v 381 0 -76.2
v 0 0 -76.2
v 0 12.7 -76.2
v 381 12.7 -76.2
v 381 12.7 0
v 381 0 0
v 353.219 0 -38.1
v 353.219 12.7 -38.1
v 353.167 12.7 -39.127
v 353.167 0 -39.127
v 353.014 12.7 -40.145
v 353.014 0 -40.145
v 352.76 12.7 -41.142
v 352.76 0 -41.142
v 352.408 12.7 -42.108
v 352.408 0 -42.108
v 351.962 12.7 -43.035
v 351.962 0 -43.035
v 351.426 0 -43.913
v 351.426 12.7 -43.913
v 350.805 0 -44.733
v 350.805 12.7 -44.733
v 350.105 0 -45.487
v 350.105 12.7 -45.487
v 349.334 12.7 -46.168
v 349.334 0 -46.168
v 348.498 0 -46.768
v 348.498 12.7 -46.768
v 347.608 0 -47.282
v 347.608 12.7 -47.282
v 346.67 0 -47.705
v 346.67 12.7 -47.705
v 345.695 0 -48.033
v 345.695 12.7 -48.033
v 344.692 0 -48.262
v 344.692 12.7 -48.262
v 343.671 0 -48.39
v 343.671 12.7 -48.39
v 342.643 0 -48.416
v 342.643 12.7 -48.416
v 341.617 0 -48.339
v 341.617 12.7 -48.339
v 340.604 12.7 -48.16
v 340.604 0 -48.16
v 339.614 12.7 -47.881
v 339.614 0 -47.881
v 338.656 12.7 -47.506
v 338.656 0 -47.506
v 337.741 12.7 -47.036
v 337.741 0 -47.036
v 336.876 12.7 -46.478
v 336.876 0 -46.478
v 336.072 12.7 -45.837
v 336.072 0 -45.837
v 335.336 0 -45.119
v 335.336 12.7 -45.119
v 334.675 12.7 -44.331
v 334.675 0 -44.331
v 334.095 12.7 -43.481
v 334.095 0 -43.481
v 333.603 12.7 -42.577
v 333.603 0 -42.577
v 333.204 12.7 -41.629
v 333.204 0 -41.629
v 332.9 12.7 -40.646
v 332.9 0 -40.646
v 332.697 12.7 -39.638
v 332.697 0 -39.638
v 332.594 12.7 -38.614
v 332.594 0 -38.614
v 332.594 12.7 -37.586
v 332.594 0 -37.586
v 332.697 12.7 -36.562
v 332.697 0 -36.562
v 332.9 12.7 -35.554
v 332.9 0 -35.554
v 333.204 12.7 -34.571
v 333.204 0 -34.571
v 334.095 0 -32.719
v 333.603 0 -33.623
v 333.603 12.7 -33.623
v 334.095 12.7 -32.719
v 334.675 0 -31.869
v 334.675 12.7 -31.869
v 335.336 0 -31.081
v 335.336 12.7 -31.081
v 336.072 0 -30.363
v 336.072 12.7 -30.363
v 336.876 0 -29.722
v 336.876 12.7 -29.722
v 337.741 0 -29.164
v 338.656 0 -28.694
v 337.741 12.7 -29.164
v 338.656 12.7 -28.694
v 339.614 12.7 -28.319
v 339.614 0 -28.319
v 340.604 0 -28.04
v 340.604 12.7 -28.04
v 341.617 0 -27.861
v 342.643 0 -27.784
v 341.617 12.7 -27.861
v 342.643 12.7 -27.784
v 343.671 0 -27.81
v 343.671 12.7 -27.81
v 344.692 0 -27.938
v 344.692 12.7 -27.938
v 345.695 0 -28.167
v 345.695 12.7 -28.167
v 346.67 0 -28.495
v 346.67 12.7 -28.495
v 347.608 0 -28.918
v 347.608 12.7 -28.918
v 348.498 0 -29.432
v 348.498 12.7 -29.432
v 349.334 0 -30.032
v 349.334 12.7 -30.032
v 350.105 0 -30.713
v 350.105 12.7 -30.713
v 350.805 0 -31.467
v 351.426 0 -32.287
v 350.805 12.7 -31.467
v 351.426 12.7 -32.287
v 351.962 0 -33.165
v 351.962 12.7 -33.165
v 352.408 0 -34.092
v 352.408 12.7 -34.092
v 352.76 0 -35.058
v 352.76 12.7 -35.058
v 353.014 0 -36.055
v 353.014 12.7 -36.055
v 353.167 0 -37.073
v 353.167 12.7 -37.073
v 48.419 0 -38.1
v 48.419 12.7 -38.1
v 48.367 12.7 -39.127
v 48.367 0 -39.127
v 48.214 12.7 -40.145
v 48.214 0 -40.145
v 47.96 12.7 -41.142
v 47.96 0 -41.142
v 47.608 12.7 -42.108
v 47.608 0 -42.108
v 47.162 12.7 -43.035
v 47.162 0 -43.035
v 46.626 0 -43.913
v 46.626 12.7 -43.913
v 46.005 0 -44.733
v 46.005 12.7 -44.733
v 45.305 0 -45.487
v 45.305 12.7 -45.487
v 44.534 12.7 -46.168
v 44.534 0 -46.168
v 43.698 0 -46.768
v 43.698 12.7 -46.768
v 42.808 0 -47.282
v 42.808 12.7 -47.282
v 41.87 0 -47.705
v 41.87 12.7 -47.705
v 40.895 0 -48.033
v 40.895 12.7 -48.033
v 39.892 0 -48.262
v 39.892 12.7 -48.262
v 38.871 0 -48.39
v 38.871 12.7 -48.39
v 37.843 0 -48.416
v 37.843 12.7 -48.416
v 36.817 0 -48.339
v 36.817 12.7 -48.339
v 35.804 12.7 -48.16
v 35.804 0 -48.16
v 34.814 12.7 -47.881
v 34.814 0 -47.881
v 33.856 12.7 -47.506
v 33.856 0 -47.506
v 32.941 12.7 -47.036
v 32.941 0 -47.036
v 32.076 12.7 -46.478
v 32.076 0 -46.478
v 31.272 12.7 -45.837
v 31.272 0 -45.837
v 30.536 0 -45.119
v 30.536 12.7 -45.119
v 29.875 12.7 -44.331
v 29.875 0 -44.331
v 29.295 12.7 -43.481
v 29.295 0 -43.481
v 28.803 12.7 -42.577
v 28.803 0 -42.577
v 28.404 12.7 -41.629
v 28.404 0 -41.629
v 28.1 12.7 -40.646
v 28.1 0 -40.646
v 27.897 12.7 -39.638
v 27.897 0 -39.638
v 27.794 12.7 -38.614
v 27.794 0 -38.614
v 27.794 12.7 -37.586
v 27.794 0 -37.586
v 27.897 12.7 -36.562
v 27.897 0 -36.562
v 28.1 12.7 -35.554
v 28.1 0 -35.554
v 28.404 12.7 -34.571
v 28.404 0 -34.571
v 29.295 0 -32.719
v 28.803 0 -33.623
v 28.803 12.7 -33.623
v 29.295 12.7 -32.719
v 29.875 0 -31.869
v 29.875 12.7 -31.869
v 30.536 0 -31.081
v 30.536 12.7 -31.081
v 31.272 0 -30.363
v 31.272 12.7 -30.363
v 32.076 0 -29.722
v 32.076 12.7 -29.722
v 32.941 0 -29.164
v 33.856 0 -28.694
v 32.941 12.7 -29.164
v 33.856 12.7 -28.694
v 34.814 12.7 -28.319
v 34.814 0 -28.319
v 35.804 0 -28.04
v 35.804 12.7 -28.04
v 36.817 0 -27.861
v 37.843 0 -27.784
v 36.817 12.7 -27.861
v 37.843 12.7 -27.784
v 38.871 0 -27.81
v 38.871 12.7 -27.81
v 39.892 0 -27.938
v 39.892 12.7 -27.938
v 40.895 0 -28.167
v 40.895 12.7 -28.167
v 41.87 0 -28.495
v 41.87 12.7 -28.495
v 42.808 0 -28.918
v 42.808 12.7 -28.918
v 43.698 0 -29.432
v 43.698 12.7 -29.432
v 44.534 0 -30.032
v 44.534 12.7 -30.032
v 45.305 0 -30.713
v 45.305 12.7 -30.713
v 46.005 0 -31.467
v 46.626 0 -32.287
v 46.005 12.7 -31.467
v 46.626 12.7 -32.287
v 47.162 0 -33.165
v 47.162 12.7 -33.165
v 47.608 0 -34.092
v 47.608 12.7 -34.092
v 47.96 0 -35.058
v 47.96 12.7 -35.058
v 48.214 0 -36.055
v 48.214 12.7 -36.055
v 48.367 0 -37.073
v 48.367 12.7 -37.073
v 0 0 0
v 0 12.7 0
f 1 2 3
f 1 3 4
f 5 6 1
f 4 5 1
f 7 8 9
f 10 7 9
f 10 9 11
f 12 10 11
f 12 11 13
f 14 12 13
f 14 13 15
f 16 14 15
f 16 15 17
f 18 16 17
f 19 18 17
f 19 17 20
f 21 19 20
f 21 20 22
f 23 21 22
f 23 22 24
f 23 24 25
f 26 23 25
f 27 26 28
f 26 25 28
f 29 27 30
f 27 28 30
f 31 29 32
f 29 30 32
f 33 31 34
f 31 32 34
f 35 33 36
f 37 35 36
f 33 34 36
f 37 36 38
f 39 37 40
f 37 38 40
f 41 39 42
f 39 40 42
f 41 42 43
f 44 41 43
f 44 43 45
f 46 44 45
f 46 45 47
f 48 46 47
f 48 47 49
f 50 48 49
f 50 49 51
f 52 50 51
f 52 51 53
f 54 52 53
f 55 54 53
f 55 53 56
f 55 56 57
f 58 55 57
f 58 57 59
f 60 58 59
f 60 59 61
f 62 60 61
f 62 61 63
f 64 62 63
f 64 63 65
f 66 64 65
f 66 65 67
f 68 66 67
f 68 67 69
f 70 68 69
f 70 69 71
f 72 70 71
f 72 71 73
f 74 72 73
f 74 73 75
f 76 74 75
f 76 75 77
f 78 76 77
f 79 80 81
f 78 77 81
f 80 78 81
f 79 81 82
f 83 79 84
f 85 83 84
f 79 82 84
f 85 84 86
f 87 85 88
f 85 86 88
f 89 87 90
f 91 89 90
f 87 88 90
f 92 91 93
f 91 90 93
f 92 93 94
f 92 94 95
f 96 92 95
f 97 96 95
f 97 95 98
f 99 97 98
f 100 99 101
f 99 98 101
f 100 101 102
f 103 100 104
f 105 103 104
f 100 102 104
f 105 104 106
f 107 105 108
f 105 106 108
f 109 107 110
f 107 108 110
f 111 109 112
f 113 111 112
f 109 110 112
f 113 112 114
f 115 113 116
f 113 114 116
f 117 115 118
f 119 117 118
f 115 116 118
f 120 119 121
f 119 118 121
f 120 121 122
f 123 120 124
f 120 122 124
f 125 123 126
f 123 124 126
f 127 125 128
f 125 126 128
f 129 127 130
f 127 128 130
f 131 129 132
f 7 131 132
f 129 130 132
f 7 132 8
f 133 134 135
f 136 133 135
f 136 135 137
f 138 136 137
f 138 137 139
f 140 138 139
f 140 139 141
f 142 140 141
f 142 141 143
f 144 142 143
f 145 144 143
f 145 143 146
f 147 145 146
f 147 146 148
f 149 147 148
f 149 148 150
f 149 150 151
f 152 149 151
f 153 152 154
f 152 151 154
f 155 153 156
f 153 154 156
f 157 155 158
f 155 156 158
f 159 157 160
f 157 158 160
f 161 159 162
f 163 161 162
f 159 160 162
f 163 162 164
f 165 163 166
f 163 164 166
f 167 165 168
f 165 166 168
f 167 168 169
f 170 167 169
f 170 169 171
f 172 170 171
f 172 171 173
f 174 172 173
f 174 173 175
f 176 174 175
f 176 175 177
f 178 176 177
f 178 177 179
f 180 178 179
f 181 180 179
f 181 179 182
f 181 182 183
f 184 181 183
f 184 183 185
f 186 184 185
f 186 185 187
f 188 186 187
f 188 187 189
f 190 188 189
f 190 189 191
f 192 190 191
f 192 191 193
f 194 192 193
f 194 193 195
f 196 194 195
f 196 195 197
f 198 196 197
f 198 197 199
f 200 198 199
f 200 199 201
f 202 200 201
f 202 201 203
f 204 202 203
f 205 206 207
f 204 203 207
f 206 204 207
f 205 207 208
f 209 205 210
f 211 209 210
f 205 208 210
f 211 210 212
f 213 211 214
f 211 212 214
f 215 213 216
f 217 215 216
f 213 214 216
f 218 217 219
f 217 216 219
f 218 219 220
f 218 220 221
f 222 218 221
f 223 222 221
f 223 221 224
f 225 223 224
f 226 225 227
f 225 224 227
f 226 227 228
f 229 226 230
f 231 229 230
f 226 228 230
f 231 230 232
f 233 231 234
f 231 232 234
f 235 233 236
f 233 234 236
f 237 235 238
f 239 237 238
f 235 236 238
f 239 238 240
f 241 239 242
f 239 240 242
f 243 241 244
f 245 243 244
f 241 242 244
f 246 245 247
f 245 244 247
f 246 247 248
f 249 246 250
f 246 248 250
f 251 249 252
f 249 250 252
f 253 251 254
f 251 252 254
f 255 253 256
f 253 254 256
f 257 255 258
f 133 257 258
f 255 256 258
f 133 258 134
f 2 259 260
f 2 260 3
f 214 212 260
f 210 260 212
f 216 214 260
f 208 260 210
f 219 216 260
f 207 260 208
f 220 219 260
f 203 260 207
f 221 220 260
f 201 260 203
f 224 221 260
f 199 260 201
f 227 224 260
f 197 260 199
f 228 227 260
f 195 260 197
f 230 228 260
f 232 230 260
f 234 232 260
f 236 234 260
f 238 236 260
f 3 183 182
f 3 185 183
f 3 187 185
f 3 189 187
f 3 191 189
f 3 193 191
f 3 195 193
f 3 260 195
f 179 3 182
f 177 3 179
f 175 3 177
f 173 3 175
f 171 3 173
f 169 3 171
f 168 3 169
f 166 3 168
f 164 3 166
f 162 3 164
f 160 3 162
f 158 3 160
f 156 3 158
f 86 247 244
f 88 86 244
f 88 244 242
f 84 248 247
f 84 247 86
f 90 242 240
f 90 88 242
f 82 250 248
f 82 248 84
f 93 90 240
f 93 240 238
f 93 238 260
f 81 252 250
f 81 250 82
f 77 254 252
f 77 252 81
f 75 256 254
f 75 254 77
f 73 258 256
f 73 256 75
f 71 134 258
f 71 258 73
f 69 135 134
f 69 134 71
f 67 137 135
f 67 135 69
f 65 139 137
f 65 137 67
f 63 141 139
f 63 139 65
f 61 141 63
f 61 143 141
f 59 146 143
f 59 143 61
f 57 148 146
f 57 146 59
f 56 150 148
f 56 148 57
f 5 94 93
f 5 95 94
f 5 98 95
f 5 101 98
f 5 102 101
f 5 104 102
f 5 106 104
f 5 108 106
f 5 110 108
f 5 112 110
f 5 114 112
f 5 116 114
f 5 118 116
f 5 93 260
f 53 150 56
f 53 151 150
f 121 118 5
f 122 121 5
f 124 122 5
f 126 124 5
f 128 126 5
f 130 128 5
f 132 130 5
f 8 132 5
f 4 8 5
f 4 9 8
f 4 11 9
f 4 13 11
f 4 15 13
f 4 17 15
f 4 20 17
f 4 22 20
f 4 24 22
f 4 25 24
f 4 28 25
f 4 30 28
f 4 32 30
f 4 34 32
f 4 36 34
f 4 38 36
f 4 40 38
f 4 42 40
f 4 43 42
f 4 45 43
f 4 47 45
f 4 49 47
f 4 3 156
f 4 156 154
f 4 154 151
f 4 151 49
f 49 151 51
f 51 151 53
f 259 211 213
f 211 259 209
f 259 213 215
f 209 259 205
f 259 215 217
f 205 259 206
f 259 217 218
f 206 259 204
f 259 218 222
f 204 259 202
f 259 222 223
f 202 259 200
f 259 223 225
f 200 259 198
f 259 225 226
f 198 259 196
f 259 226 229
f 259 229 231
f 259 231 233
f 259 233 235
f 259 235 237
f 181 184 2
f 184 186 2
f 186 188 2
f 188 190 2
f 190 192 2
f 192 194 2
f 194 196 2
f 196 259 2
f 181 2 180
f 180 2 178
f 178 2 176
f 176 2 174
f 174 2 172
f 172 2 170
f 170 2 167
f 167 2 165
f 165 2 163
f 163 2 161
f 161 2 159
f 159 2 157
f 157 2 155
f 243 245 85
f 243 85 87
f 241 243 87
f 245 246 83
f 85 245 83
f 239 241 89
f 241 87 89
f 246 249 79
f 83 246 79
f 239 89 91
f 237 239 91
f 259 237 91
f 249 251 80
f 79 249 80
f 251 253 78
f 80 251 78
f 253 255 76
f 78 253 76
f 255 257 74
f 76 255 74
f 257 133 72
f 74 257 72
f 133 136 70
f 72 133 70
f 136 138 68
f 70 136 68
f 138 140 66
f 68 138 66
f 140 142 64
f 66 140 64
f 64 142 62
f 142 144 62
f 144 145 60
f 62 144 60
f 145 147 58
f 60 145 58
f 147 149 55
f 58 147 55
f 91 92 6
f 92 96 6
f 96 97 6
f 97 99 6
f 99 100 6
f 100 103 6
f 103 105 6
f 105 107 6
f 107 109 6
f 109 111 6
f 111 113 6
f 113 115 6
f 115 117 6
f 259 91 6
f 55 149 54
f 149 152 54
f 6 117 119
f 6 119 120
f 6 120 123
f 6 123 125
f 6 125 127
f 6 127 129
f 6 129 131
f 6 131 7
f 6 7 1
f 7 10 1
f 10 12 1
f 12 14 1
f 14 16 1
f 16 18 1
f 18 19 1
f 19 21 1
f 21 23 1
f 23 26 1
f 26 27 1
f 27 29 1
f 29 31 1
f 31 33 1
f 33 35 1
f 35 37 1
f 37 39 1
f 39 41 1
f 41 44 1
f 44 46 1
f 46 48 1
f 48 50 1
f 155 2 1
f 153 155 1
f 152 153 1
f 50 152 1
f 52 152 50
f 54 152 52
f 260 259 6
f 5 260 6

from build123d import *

# Parameters (mm, degrees)
SKETCH1_W           = 381
SKETCH1_H           = 76.2
BOSS_EXTRUDE1_DEPTH = 12.7
CUT_EXTRUDE1_REACH  = 14.7
SKETCH2_R           = 10.31875


with BuildPart() as part:
    # Sketch1 → Boss-Extrude1 (new body)
    with BuildSketch(Plane(origin=(0, 0, 0), x_dir=(1, 0, 0), z_dir=(0, 1, 0))):
        with Locations((190.5, 38.1)):
            Rectangle(SKETCH1_W, SKETCH1_H)
    extrude(amount=BOSS_EXTRUDE1_DEPTH)

    # Sketch2 → Cut-Extrude1 (cut, up to next)
    with BuildSketch(Plane(origin=(0, 12.7, 0), x_dir=(1, 0, 0), z_dir=(0, 1, 0)), mode=Mode.PRIVATE) as cut_extrude1_sk1:
        with Locations((38.1, 38.1)):
            Circle(SKETCH2_R)
    cut_extrude1_tool1 = extrude(cut_extrude1_sk1.sketch, amount=-CUT_EXTRUDE1_REACH, mode=Mode.PRIVATE) & part.part
    add(cut_extrude1_tool1.solids().sort_by_distance((38.1, 12.7, -38.1))[0], mode=Mode.SUBTRACT)
    # Sketch2 → Cut-Extrude1 (cut, up to next)
    with BuildSketch(Plane(origin=(0, 12.7, 0), x_dir=(1, 0, 0), z_dir=(0, 1, 0)), mode=Mode.PRIVATE) as cut_extrude1_sk2:
        with Locations((342.9, 38.1)):
            Circle(SKETCH2_R)
    cut_extrude1_tool2 = extrude(cut_extrude1_sk2.sketch, amount=-CUT_EXTRUDE1_REACH, mode=Mode.PRIVATE) & part.part
    add(cut_extrude1_tool2.solids().sort_by_distance((342.9, 12.7, -38.1))[0], mode=Mode.SUBTRACT)


solid = part.part
